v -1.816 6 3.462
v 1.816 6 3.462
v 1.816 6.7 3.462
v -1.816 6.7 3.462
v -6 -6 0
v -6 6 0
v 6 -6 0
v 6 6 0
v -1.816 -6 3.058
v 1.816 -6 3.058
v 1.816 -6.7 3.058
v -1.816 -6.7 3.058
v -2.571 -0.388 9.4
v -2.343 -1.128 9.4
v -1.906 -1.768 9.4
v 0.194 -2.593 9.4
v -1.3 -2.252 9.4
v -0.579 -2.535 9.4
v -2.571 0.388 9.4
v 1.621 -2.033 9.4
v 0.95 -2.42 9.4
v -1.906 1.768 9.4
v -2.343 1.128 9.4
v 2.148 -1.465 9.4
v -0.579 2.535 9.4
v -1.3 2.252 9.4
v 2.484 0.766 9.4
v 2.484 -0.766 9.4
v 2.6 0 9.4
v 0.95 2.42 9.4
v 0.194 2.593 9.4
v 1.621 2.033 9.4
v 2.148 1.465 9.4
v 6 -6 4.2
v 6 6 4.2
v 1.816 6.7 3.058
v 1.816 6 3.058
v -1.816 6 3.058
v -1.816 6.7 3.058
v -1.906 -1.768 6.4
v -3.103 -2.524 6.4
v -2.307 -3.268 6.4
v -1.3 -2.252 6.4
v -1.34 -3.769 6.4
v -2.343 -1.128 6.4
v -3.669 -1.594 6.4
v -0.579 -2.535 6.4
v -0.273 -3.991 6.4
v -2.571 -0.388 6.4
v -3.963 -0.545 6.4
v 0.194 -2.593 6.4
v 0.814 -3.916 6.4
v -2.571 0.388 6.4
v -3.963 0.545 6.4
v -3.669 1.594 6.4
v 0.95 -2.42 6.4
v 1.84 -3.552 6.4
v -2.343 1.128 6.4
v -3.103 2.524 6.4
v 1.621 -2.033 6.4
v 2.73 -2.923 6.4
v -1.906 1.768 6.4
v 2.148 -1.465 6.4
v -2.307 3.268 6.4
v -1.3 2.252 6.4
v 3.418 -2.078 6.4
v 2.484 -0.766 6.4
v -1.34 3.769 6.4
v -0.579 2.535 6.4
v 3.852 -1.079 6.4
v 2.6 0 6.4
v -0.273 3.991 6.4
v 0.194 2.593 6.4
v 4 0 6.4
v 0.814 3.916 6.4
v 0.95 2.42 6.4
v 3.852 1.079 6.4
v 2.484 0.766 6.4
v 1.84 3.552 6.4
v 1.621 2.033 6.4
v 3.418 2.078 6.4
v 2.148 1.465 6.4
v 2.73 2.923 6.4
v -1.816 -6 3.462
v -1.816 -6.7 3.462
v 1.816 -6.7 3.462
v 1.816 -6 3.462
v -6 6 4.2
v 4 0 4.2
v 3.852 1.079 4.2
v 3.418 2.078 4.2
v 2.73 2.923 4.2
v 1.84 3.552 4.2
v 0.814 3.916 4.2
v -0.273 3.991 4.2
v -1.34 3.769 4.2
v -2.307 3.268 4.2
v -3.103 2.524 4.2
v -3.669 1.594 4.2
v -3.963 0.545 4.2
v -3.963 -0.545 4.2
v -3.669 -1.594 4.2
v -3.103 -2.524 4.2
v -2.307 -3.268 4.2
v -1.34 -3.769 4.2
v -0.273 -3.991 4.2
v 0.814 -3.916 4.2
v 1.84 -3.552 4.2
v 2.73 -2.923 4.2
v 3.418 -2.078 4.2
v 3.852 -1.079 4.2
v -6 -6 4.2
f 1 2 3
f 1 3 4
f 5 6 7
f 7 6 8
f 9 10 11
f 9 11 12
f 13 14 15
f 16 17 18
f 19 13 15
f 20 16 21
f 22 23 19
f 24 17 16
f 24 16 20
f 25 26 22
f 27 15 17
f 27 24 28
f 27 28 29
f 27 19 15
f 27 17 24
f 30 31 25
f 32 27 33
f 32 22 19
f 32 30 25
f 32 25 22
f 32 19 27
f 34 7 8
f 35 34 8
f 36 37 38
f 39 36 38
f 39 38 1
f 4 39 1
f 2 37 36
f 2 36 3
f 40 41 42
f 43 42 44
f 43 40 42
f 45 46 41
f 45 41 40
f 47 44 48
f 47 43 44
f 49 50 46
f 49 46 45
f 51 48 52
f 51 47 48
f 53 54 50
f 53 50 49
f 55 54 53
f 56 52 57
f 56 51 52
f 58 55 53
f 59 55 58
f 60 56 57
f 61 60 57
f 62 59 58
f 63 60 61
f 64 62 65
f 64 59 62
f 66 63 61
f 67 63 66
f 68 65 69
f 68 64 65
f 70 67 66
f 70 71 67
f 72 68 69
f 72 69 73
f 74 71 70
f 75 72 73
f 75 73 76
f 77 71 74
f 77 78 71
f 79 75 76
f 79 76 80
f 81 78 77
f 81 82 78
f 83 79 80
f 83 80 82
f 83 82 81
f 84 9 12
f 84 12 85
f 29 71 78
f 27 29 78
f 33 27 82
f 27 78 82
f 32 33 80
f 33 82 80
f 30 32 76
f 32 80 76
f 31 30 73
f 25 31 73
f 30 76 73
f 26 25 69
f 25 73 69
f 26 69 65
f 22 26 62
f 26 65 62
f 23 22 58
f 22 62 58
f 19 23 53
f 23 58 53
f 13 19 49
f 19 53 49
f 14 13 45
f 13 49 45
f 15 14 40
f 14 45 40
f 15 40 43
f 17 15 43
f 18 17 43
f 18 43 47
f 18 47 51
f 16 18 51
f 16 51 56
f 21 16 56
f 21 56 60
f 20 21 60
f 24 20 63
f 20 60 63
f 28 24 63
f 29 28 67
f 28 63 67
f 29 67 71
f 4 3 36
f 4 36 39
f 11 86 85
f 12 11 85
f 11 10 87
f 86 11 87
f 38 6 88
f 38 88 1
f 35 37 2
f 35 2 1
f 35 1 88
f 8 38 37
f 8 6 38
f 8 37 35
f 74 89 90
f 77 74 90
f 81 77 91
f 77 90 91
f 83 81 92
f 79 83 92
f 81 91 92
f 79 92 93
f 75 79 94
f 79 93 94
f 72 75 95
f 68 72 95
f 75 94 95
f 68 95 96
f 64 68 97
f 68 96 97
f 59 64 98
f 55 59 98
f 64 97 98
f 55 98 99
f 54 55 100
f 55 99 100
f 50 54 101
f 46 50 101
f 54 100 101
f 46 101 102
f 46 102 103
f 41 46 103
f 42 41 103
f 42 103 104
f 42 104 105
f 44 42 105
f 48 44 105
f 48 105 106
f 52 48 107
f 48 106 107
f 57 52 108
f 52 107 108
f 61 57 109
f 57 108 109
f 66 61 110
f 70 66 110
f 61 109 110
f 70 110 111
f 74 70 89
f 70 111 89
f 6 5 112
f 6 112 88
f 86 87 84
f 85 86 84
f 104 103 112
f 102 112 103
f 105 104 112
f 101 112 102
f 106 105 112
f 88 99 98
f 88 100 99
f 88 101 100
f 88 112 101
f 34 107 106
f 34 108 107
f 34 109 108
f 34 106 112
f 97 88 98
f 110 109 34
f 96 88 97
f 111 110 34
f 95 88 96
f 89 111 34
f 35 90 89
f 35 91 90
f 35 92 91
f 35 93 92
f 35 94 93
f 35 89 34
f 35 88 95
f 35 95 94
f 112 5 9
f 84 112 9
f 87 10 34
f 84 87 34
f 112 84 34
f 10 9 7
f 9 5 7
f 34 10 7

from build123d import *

# Parameters (mm, degrees)
F0_W     = 12
F0_H     = 12
F1_DEPTH = 4.2
F2_R     = 4
F3_DEPTH = 2.2
F4_R     = 2.6
F5_DEPTH = 3
F6_W     = 3.6317317281
F6_H     = 0.4035253078
F7_DEPTH = 0.7


# Not quite as in the source:
# - a pattern or mirror of a feature is missing from the dataset's text; its kind, count and spacing are read off the source's solid


with BuildPart() as f1:
    # F0 (on Top) → F1 (new body)
    with BuildSketch(Plane.XY):
        Rectangle(F0_W, F0_H)
    extrude(amount=F1_DEPTH)

    # F2 (on face) → F3 (join)
    with BuildSketch(Plane.XY.offset(4.2)):
        Circle(F2_R)
    extrude(amount=F3_DEPTH)

    # F4 (on face) → F5 (join)
    with BuildSketch(Plane.XY.offset(6.4)):
        Circle(F4_R)
    extrude(amount=F5_DEPTH)

    # F6 (on face) → F7 (join)
    with BuildSketch(Plane(origin=(0, 6, 0), x_dir=(-1, 0, 0), z_dir=(0, 1, 0))):
        with Locations((0, 3.2601370476)):
            Rectangle(F6_W, F6_H)
    f7 = extrude(amount=F7_DEPTH)

    # F7_copies: F7 across plane
    add(f7.mirror(Plane(origin=(0, 0, 0), x_dir=(0, 0, -1), z_dir=(0, -1, 0))))


solid = f1.part
